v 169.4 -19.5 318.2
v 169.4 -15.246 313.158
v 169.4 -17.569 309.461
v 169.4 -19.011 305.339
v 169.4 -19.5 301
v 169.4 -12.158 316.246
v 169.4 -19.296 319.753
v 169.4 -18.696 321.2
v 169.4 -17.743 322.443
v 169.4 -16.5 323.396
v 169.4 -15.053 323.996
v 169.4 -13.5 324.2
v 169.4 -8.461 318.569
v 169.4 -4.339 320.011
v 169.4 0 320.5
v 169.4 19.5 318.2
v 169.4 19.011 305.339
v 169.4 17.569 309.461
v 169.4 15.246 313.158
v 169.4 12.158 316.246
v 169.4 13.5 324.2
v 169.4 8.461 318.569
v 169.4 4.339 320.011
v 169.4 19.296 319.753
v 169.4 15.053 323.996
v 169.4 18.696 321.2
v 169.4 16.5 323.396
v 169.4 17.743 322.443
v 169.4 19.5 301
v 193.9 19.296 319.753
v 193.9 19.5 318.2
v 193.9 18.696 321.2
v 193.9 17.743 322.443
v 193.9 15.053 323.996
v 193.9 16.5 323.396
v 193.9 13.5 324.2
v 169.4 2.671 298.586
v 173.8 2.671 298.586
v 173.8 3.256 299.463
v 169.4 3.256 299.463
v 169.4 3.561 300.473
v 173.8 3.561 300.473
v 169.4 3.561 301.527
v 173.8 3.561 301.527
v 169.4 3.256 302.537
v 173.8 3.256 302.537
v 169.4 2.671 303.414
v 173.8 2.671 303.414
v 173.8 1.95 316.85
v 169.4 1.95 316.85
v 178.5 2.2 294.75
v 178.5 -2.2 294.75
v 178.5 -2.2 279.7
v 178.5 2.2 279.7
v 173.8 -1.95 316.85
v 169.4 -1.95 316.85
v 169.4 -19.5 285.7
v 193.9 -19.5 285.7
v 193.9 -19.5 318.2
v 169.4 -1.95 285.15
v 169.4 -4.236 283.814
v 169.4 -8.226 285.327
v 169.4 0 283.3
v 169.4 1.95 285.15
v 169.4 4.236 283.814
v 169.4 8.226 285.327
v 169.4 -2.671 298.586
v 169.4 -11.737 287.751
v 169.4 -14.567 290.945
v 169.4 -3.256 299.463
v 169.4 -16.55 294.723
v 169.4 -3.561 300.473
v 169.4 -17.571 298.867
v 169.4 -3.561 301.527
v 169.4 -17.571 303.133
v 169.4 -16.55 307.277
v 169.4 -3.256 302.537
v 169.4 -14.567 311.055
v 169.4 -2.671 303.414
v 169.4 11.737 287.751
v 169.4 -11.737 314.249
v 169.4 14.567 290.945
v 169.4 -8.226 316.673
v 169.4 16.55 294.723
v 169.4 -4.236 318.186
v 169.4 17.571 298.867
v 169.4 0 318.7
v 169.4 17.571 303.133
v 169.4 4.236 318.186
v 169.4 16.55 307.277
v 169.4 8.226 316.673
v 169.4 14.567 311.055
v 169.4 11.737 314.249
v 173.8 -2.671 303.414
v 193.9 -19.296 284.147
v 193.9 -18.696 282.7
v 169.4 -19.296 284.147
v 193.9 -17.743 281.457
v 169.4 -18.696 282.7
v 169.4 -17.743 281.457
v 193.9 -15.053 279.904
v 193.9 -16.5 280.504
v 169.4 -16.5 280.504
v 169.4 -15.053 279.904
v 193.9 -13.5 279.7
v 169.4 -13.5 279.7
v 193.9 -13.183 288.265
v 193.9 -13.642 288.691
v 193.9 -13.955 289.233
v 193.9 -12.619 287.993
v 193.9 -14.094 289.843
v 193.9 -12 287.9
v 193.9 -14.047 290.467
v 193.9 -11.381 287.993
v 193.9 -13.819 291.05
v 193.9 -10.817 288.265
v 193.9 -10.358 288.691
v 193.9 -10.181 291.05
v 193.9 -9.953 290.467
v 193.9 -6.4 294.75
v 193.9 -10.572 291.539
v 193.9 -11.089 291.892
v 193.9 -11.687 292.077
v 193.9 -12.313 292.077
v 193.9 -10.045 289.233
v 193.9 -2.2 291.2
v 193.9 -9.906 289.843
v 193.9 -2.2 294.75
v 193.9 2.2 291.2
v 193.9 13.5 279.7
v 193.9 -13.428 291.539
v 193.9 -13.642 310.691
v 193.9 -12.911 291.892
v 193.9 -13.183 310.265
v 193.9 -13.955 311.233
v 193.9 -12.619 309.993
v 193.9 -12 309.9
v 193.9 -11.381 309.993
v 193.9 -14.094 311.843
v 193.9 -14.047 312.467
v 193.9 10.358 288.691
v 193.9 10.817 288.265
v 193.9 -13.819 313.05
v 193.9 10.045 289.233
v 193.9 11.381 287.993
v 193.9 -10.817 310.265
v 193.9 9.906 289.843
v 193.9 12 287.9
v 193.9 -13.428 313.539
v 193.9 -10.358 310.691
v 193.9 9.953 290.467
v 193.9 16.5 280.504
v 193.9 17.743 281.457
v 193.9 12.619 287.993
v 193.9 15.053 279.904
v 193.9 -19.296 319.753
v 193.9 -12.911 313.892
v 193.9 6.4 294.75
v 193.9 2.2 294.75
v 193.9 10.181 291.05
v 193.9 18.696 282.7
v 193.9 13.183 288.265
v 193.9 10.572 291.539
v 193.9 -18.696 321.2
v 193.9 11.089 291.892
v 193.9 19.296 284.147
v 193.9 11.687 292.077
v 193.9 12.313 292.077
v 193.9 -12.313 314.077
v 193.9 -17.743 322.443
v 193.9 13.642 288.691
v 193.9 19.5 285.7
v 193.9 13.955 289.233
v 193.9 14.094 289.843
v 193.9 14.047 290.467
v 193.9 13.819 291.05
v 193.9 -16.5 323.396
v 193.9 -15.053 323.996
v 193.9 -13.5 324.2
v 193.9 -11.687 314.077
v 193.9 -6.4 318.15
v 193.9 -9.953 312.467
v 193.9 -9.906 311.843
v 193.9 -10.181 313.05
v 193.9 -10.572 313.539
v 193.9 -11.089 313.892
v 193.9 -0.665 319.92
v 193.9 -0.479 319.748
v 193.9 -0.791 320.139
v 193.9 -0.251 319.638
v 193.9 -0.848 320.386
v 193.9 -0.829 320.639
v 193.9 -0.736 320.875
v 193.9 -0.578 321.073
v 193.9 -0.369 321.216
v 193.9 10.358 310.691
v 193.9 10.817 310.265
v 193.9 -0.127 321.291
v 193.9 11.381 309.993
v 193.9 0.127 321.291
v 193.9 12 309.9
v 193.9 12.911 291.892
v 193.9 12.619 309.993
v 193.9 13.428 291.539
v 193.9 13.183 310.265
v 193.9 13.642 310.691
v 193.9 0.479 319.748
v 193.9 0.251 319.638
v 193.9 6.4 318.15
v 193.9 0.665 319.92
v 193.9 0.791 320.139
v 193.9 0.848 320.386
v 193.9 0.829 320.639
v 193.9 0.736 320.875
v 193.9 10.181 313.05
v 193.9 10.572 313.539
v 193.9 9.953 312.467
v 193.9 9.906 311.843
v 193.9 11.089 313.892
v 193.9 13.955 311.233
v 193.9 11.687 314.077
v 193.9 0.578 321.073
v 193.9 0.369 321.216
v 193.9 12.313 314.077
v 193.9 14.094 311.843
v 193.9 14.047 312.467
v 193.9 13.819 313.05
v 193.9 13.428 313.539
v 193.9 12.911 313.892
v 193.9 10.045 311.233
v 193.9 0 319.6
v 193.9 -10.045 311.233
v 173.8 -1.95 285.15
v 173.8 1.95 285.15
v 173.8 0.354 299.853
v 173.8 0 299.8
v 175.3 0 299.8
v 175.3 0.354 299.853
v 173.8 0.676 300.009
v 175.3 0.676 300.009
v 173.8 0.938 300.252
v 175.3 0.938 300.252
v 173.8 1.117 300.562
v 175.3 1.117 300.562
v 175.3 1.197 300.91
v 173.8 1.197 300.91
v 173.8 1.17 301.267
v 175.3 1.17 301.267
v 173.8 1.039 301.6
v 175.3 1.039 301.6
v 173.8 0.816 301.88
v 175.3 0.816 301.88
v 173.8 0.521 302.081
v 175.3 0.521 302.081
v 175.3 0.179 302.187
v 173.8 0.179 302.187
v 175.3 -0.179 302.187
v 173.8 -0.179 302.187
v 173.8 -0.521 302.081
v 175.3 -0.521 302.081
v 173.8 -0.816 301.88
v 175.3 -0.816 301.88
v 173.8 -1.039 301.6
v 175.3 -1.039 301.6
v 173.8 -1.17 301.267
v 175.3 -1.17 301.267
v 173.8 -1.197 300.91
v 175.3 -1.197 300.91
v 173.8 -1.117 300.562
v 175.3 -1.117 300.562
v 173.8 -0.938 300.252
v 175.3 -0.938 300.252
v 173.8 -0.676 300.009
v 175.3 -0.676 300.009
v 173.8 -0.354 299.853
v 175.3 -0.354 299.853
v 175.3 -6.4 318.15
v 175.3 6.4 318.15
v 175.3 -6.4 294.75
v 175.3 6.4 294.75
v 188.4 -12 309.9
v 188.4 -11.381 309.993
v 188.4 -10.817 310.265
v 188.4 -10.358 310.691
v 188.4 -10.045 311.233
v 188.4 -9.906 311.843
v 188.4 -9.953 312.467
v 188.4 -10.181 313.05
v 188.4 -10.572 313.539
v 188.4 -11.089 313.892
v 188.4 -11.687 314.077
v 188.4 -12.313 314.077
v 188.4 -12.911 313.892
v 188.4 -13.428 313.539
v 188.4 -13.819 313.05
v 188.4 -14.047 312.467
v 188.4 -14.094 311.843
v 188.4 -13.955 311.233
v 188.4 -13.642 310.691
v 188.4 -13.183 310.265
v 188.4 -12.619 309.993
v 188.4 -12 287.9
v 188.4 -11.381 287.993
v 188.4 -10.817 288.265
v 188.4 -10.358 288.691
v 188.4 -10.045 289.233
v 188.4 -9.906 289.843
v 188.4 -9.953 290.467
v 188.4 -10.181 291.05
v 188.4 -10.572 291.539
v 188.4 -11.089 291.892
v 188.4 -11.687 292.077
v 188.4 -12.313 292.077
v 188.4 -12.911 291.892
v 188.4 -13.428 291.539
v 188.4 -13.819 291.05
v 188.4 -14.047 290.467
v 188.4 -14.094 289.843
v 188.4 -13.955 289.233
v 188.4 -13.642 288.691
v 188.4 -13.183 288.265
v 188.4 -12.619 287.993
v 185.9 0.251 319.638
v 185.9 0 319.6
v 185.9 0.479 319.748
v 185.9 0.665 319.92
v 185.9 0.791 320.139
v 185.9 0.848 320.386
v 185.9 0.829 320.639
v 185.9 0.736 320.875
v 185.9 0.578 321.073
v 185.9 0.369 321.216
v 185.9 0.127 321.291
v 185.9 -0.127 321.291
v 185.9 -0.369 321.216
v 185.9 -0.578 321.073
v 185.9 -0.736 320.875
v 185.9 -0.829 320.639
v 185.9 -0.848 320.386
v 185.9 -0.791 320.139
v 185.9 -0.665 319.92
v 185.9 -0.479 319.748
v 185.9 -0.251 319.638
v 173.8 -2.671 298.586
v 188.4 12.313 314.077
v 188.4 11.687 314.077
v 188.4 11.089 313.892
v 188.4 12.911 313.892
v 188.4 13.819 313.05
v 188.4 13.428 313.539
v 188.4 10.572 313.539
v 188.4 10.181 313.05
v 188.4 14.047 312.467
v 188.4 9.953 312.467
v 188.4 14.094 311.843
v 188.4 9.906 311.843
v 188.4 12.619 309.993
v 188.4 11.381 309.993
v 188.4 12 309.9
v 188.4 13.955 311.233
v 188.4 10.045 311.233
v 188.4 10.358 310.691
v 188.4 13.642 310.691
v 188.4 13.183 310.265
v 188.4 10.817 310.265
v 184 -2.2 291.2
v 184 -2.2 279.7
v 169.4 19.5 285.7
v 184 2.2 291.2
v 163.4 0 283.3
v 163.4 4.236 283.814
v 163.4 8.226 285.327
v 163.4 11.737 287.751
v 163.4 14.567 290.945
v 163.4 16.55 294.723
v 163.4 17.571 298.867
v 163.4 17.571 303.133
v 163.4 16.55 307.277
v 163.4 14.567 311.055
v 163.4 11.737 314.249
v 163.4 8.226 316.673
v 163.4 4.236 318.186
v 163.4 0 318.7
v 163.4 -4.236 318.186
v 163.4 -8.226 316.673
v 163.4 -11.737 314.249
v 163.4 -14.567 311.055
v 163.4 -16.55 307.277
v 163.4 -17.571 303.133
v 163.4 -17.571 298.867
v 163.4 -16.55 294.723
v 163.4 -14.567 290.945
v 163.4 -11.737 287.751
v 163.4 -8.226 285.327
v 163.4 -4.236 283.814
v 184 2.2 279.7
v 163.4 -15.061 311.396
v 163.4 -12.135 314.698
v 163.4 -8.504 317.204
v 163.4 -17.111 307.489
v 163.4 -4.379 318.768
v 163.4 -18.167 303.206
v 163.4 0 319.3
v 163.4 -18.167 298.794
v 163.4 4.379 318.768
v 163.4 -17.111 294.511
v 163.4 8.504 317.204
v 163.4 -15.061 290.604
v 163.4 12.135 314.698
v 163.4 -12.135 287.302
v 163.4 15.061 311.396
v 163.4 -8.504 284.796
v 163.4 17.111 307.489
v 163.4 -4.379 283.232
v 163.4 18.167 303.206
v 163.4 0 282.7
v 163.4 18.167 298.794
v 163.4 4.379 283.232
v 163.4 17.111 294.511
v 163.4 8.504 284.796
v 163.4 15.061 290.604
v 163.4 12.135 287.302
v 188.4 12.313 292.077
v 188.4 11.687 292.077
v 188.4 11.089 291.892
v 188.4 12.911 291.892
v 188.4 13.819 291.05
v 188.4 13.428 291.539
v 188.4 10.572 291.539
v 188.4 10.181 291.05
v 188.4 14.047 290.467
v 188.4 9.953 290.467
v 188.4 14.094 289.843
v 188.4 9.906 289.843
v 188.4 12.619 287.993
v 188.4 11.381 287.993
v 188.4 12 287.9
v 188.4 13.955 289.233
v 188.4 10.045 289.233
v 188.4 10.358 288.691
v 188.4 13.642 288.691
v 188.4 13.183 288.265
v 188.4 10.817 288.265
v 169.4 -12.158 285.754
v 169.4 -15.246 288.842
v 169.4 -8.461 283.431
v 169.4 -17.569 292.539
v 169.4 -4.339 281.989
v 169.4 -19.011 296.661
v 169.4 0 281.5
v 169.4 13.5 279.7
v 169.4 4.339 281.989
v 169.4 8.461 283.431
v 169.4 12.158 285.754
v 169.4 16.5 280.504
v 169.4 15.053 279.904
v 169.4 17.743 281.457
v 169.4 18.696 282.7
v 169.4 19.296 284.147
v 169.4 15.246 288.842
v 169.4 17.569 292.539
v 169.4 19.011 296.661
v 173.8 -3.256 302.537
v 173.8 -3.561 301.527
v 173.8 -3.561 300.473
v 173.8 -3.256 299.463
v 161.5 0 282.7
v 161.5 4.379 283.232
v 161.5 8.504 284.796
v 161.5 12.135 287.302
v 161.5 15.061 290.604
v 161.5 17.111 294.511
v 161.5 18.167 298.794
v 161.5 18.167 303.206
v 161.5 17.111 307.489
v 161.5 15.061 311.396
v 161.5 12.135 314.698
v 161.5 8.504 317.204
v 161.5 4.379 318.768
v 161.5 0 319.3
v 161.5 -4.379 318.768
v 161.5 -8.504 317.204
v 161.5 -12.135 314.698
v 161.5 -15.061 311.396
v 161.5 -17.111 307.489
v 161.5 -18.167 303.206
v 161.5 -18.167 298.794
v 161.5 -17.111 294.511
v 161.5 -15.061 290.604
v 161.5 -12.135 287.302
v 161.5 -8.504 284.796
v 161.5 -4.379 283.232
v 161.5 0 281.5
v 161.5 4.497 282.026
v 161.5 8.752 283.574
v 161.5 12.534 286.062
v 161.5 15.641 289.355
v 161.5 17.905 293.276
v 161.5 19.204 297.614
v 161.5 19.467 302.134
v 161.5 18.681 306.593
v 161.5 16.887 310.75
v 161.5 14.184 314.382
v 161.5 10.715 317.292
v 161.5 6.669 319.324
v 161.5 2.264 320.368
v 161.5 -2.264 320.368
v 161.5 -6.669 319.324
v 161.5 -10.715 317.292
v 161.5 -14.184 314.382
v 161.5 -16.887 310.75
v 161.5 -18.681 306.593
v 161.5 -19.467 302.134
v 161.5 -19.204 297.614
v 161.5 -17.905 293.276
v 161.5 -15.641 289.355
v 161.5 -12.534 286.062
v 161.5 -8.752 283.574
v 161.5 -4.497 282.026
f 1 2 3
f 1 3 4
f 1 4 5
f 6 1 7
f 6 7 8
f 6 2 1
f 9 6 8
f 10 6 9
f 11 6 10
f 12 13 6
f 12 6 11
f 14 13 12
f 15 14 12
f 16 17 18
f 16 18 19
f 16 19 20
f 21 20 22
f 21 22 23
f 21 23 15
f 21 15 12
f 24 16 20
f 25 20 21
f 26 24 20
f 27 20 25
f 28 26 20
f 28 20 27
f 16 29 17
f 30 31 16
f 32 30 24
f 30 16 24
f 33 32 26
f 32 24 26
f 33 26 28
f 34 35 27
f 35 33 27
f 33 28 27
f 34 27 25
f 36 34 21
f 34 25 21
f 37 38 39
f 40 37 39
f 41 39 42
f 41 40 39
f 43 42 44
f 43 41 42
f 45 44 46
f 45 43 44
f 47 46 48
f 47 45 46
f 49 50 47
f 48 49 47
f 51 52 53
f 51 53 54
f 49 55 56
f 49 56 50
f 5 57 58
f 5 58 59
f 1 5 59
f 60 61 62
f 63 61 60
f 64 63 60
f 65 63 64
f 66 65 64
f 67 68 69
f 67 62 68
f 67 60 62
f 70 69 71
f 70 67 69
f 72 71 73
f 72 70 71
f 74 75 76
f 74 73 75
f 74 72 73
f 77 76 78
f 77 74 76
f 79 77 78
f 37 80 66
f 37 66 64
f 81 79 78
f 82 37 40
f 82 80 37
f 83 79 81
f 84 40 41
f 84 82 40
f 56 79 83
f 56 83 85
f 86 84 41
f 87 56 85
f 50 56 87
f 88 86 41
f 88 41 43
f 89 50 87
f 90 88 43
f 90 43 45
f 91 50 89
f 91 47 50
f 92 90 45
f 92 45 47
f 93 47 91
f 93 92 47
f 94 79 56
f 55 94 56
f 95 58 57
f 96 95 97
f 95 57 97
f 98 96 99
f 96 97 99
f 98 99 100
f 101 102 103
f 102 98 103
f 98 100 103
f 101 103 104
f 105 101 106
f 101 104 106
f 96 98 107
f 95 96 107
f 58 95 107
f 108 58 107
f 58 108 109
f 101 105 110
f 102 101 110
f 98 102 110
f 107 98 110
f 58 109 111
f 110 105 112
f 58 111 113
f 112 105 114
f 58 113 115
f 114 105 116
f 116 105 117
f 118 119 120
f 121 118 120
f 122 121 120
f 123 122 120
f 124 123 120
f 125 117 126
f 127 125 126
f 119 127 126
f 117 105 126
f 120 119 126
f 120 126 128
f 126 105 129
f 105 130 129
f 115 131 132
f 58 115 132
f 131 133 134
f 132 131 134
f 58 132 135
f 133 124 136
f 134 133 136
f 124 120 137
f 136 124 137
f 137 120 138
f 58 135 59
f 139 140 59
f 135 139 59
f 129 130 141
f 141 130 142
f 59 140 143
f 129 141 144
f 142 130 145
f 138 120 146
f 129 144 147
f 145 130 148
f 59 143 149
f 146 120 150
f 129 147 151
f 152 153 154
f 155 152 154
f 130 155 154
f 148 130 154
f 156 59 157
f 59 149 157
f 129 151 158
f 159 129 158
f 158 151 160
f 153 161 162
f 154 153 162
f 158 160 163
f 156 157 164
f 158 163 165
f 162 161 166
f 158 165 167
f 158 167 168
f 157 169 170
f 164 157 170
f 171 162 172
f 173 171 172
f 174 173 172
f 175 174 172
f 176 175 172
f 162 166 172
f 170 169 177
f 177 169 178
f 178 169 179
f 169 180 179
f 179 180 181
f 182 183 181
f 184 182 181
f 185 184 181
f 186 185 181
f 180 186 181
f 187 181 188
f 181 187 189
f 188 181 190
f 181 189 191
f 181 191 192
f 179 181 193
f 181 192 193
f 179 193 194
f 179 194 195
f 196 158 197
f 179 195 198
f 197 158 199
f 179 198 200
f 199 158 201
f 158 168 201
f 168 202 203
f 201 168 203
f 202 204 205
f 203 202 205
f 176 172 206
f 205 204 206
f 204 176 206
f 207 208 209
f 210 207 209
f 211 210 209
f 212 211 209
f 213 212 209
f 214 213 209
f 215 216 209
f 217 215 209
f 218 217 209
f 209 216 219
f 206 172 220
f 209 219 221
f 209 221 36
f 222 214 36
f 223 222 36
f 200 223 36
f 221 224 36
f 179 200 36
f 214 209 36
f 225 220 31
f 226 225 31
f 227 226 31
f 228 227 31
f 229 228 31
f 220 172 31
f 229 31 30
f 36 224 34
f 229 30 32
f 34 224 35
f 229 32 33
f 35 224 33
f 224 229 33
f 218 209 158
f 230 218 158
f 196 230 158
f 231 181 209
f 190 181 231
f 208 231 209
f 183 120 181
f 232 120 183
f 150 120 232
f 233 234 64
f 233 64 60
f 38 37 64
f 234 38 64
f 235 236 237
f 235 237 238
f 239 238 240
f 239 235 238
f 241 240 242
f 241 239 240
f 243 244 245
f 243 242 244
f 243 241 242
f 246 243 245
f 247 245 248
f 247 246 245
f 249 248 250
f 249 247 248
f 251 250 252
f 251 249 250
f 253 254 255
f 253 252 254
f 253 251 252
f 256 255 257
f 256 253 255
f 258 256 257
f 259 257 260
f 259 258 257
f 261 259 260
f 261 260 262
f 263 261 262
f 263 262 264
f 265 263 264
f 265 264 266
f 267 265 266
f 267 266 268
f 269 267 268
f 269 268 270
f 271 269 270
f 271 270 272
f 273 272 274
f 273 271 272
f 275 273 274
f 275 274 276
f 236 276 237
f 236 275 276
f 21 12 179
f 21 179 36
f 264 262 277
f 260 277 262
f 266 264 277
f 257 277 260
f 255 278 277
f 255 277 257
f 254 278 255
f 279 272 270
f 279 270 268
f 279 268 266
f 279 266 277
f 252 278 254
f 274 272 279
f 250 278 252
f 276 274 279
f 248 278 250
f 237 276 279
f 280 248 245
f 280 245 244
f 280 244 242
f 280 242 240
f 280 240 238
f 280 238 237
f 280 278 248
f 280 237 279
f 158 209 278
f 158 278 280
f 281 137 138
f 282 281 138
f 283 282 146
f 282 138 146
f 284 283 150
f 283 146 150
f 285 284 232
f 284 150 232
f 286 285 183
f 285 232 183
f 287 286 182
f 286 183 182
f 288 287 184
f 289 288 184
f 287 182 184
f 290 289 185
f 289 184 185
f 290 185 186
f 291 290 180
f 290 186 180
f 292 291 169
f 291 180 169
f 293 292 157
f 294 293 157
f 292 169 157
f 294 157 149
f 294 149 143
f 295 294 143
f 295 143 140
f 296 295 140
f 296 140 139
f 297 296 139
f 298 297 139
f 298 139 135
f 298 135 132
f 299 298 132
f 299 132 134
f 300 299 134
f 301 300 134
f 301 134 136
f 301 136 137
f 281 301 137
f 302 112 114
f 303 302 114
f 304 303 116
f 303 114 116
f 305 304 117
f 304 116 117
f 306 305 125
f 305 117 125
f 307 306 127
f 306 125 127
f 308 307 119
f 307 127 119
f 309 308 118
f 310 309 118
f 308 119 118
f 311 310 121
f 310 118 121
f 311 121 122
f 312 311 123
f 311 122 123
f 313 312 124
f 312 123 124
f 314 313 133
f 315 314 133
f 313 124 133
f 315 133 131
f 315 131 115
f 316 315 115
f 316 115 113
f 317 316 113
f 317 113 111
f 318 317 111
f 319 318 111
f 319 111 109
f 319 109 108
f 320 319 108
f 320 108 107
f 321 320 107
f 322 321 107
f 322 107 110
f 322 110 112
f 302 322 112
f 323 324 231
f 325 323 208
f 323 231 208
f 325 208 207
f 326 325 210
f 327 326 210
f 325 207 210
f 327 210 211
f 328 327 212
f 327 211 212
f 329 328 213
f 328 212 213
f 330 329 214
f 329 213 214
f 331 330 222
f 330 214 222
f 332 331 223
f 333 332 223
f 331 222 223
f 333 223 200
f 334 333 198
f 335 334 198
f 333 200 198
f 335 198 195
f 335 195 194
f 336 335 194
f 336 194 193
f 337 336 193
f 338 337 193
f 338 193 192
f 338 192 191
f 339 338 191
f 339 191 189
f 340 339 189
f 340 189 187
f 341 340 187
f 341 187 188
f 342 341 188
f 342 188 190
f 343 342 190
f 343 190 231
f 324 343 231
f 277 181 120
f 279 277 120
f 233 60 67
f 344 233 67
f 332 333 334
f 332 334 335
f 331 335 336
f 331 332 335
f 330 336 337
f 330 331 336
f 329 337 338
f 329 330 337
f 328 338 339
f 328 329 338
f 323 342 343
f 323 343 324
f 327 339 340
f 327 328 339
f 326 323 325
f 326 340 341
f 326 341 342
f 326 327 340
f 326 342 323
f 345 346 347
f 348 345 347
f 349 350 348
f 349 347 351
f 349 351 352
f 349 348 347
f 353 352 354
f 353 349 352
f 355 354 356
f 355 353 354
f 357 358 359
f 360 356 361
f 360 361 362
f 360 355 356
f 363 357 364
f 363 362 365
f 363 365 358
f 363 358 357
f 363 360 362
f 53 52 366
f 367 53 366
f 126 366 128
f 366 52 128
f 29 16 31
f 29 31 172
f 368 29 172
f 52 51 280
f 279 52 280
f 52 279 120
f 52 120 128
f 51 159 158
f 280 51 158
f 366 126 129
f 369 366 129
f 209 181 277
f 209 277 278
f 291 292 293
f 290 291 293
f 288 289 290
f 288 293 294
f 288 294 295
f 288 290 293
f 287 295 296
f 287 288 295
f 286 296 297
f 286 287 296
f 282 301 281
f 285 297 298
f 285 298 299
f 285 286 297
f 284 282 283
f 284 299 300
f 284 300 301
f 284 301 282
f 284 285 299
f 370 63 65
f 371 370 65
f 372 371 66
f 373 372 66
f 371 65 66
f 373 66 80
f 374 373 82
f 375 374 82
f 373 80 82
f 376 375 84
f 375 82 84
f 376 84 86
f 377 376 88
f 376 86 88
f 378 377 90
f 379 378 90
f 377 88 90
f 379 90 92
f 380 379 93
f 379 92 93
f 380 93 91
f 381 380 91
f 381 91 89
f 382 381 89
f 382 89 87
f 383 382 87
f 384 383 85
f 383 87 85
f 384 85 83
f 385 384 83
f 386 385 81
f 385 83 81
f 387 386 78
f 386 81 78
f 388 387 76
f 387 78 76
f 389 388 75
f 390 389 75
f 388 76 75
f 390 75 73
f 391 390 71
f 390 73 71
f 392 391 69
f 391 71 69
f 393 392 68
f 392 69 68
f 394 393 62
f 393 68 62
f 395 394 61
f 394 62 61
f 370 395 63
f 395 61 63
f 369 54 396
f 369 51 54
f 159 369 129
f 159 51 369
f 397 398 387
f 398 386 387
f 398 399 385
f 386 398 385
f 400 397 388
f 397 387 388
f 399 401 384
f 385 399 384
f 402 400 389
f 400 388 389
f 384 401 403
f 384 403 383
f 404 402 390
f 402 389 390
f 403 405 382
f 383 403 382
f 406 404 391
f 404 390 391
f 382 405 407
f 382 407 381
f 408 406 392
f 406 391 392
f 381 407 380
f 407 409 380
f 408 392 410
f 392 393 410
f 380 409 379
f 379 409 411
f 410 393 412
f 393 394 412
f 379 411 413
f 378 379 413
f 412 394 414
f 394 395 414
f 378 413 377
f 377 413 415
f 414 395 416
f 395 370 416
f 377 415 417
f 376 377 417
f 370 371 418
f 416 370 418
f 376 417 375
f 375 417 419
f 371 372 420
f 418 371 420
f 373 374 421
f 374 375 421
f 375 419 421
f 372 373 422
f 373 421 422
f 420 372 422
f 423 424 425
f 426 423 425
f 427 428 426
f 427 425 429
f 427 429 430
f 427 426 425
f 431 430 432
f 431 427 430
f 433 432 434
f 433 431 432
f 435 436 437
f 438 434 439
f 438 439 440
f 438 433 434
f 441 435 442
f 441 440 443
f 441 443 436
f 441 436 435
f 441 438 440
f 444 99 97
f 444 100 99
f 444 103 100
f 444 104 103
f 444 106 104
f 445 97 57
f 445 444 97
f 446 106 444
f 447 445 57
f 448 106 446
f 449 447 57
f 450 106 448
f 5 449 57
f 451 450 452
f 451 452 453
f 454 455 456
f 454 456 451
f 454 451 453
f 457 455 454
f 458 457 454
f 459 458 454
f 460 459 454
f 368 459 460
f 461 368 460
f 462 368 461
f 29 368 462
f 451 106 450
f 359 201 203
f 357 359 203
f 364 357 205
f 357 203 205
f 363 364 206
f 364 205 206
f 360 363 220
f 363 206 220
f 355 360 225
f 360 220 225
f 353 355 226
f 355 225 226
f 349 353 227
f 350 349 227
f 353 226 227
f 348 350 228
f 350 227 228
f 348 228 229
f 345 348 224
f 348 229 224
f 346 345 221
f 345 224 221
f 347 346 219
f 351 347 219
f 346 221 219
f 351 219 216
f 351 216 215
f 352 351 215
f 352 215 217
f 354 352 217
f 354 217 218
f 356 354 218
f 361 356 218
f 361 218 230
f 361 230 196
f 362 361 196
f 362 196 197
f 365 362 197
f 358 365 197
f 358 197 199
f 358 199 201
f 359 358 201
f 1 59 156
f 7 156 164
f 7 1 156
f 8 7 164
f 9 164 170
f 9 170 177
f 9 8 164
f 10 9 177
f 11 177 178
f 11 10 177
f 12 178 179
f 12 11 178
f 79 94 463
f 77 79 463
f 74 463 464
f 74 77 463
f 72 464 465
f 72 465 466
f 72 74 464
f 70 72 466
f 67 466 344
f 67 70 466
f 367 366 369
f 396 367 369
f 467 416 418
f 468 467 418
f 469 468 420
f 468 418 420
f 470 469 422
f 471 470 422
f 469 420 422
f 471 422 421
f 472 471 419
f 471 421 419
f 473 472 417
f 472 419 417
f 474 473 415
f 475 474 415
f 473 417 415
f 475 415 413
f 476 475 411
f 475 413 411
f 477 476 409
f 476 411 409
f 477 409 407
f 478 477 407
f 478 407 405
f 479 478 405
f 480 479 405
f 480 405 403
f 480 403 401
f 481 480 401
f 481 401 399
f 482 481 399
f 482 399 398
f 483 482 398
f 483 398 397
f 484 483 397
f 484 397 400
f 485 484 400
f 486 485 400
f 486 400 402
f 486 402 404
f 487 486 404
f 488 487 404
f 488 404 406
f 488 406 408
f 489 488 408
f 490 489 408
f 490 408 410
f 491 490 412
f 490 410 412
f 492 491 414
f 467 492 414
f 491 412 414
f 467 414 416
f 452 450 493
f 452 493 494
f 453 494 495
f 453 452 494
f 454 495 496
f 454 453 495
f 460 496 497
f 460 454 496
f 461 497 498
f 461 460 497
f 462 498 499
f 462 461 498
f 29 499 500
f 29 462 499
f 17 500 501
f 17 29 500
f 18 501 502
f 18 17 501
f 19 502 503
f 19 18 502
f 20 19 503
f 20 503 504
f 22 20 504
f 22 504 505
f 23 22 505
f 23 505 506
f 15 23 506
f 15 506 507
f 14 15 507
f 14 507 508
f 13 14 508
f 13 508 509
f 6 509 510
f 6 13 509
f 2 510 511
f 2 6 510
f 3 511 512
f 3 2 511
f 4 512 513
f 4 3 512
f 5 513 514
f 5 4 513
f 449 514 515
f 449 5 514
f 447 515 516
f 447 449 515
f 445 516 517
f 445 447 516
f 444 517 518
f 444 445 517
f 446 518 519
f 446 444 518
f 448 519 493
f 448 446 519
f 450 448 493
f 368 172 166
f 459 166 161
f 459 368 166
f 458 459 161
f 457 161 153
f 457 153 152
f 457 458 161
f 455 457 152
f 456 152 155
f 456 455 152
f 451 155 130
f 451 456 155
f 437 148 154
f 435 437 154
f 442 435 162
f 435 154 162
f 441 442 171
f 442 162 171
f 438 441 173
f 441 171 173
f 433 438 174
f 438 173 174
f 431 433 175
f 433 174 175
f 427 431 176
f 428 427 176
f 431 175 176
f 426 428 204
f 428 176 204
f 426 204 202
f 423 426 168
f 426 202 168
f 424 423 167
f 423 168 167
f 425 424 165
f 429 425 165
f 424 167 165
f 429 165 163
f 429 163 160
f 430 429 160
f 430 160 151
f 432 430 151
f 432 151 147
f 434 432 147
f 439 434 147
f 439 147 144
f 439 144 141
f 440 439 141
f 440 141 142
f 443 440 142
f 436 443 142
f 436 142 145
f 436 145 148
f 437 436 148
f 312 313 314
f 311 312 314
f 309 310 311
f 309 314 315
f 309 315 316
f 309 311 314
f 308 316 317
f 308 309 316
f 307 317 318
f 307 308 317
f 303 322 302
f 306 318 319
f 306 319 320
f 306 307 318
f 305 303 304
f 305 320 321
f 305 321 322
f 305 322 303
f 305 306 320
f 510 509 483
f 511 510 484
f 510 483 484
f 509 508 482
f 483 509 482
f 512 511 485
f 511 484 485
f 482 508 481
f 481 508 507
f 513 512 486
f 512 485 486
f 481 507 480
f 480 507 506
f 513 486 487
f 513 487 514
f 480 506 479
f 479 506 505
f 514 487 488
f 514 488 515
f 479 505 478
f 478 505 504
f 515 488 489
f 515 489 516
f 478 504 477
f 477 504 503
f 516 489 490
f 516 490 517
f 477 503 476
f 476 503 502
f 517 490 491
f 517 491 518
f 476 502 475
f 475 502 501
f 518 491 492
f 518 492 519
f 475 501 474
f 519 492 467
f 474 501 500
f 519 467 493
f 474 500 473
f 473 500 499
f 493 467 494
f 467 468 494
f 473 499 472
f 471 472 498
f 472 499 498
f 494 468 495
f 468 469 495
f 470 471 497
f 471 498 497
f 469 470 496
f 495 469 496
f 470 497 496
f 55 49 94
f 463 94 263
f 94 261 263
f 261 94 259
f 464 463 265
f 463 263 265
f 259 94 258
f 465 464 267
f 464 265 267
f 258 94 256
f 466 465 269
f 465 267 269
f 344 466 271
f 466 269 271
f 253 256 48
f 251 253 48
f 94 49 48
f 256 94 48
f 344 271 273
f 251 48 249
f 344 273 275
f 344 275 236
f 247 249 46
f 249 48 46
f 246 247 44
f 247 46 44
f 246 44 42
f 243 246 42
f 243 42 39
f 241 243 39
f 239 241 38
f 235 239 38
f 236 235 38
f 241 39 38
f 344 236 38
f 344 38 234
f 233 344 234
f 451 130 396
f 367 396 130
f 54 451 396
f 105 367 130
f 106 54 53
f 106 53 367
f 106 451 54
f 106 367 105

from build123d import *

# Parameters (mm, degrees)
SKETCH1_W           = 40.7
SKETCH1_H           = 17
BOSS_EXTRUDE1_DEPTH = 24.5
SKETCH2_W           = 40.7
SKETCH2_H           = 34
BOSS_EXTRUDE2_DEPTH = 4
SKETCH3_R           = 3.6
CUT_EXTRUDE1_DEPTH  = 4.4
CUT_EXTRUDE2_DEPTH  = 4.4
SKETCH5_R           = 1.2
CUT_EXTRUDE3_DEPTH  = 7
SKETCH6_W           = 23.4
SKETCH6_H           = 12.8
CUT_EXTRUDE4_DEPTH  = 19.2
SKETCH7_W           = 3.7
SKETCH7_H           = 4.4
CUT_EXTRUDE5_DEPTH  = 16
SKETCH8_R           = 0.85
CUT_EXTRUDE6_DEPTH  = 8.6
SKETCH9_R           = 1.7
CUT_EXTRUDE7_DEPTH  = 4.7
SKETCH10_W          = 5.5
SKETCH10_H          = 4.4
CUT_EXTRUDE8_DEPTH  = 8.3
BOSS_EXTRUDE3_DEPTH = 24.5
SKETCH12_W          = 5.5
SKETCH12_H          = 4.4
CUT_EXTRUDE9_DEPTH  = 3.5
CUT_EXTRUDE10_DEPTH = 326.708673511
SKETCH14_R          = 19.5
SKETCH14_R_2        = 18.3
BOSS_EXTRUDE4_DEPTH = 7.9
SKETCH15_R          = 2.1
CUT_EXTRUDE11_DEPTH = 6.1
SKETCH16_R          = 18.3
SKETCH16_R_2        = 17.7
BOSS_EXTRUDE6_DEPTH = 6


with BuildPart() as part:
    # Sketch1 → Boss-Extrude1 (new body)
    with BuildSketch(Plane(origin=(169.4, 0, 0), x_dir=(0, 0, -1), z_dir=(1, 0, 0))):
        with Locations((-303.85, 0)):
            Rectangle(SKETCH1_W, SKETCH1_H)
    extrude(amount=BOSS_EXTRUDE1_DEPTH)

    # Sketch2 → Boss-Extrude2 (add)
    with BuildSketch(Plane(origin=(189.9, 0, 0), x_dir=(0, 0, -1), z_dir=(1, 0, 0))):
        with Locations((-303.85, 0)):
            Rectangle(SKETCH2_W, SKETCH2_H)
    extrude(amount=BOSS_EXTRUDE2_DEPTH)

    # Sketch3 → Cut-Extrude1 (cut)
    with BuildSketch(Plane(origin=(169.4, 0, 0), x_dir=(0, 0, -1), z_dir=(1, 0, 0))):
        with Locations((-301, 0)):
            Circle(SKETCH3_R)
    extrude(amount=CUT_EXTRUDE1_DEPTH, mode=Mode.SUBTRACT)

    # Sketch4 → Cut-Extrude2 (cut)
    with BuildSketch(Plane(origin=(169.4, 0, 0), x_dir=(0, 0, -1), z_dir=(1, 0, 0))):
        Polygon((-285.15, -1.95), (-301, -2.8), (-316.85, -1.95), (-316.85, 1.95), (-301, 2.8), (-285.15, 1.95), align=None)
    extrude(amount=CUT_EXTRUDE2_DEPTH, mode=Mode.SUBTRACT)

    # Sketch5 → Cut-Extrude3 (cut)
    with BuildSketch(Plane(origin=(169.4, 0, 0), x_dir=(0, 0, -1), z_dir=(1, 0, 0))):
        with Locations((-301, 0)):
            Circle(SKETCH5_R)
    extrude(amount=CUT_EXTRUDE3_DEPTH, mode=Mode.SUBTRACT)

    # Sketch6 → Cut-Extrude4 (cut)
    with BuildSketch(Plane(origin=(194.5, 0, 0), x_dir=(0, 0, -1), z_dir=(1, 0, 0))):
        with Locations((-306.45, 0)):
            Rectangle(SKETCH6_W, SKETCH6_H)
    extrude(amount=-CUT_EXTRUDE4_DEPTH, mode=Mode.SUBTRACT)

    # Sketch7 → Cut-Extrude5 (cut)
    with BuildSketch(Plane(origin=(194.5, 0, 0), x_dir=(0, 0, -1), z_dir=(1, 0, 0))):
        with Locations((-293.05, 0)):
            Rectangle(SKETCH7_W, SKETCH7_H)
    extrude(amount=-CUT_EXTRUDE5_DEPTH, mode=Mode.SUBTRACT)

    # Sketch8 → Cut-Extrude6 (cut)
    with BuildSketch(Plane(origin=(194.5, 0, 0), x_dir=(0, 0, -1), z_dir=(1, 0, 0))):
        with Locations((-320.45, 0)):
            Circle(SKETCH8_R)
    extrude(amount=-CUT_EXTRUDE6_DEPTH, mode=Mode.SUBTRACT)

    # Sketch9 → Cut-Extrude7 (cut)
    with BuildSketch(Plane(origin=(194.5, 0, 0), x_dir=(0, 0, -1), z_dir=(1, 0, 0))):
        with Locations(Location((-290, 12, 0), (0, 0, 180))):
            Circle(SKETCH9_R)
        with Locations(Location((-290, -12, 0), (0, 0, 180))):
            Circle(SKETCH9_R)
        with Locations(Location((-312, 12, 0), (0, 0, 180))):
            Circle(SKETCH9_R)
        with Locations(Location((-312, -12, 0), (0, 0, 180))):
            Circle(SKETCH9_R)
    extrude(amount=-CUT_EXTRUDE7_DEPTH, mode=Mode.SUBTRACT)

    # Sketch10 → Cut-Extrude8 (cut)
    with BuildSketch(Plane.XY.offset(283)):
        with Locations((181.25, 0)):
            Rectangle(SKETCH10_W, SKETCH10_H)
    extrude(amount=CUT_EXTRUDE8_DEPTH, mode=Mode.SUBTRACT)

    # Sketch11 → Boss-Extrude3 (add)
    with BuildSketch(Plane(origin=(169.4, 0, 0), x_dir=(0, 0, -1), z_dir=(1, 0, 0))):
        Polygon((-279.7, -19.5), (-324.2, -19.5), (-324.2, -8.5), (-283.5, -8.5), (-283.5, 8.5), (-324.2, 8.5), (-324.2, 19.5), (-279.7, 19.5), align=None)
    extrude(amount=BOSS_EXTRUDE3_DEPTH)

    # Sketch12 → Cut-Extrude9 (cut, symmetric)
    with BuildSketch(Plane.XY.offset(283)):
        with Locations((181.25, 0)):
            Rectangle(SKETCH12_W, SKETCH12_H)
    extrude(amount=CUT_EXTRUDE9_DEPTH, both=True, mode=Mode.SUBTRACT)

    # Sketch13 → Cut-Extrude10 (cut, through all)
    with BuildSketch(Plane(origin=(169.4, 0, 0), x_dir=(0, 0, -1), z_dir=(1, 0, 0))):
        with BuildLine():
            Line((-324.2, 13.5), (-325.5, 13.5))
            Line((-325.5, 13.5), (-325.5, 20.5))
            Line((-325.5, 20.5), (-318.2, 20.5))
            Line((-318.2, 20.5), (-318.2, 19.5))
            ThreePointArc((-318.2, 19.5), (-322.442640687, 17.742640687), (-324.2, 13.5))
        make_face()
        with BuildLine():
            Line((-324.2, -13.5), (-325.5, -13.5))
            Line((-325.5, -13.5), (-325.5, -20.5))
            Line((-325.5, -20.5), (-318.2, -20.5))
            Line((-318.2, -20.5), (-318.2, -19.5))
            ThreePointArc((-318.2, -19.5), (-322.442640687, -17.742640687), (-324.2, -13.5))
        make_face()
        with BuildLine():
            Line((-279.7, 13.5), (-278.4, 13.5))
            Line((-278.4, 13.5), (-278.4, 20.5))
            Line((-278.4, 20.5), (-285.7, 20.5))
            Line((-285.7, 20.5), (-285.7, 19.5))
            ThreePointArc((-285.7, 19.5), (-281.457359313, 17.742640687), (-279.7, 13.5))
        make_face()
        with BuildLine():
            Line((-279.7, -13.5), (-278.4, -13.5))
            Line((-278.4, -13.5), (-278.4, -20.5))
            Line((-278.4, -20.5), (-285.7, -20.5))
            Line((-285.7, -20.5), (-285.7, -19.5))
            ThreePointArc((-285.7, -19.5), (-281.457359313, -17.742640687), (-279.7, -13.5))
        make_face()
    extrude(amount=CUT_EXTRUDE10_DEPTH, mode=Mode.SUBTRACT)

    # Sketch14 → Boss-Extrude4 (add)
    with BuildSketch(Plane(origin=(169.4, 0, 0), x_dir=(0, 0, -1), z_dir=(1, 0, 0))):
        with Locations((-301, 0)):
            Circle(SKETCH14_R)
        with Locations((-301, 0)):
            Circle(SKETCH14_R_2, mode=Mode.SUBTRACT)
    extrude(amount=-BOSS_EXTRUDE4_DEPTH)

    # Sketch15 → Cut-Extrude11 (cut)
    with BuildSketch(Plane(origin=(194.5, 0, 0), x_dir=(0, 0, -1), z_dir=(1, 0, 0))):
        with Locations((-290, 12)):
            Circle(SKETCH15_R)
        with Locations((-290, -12)):
            Circle(SKETCH15_R)
        with Locations((-312, 12)):
            Circle(SKETCH15_R)
        with Locations((-312, -12)):
            Circle(SKETCH15_R)
    extrude(amount=-CUT_EXTRUDE11_DEPTH, mode=Mode.SUBTRACT)

    # Sketch16 → Boss-Extrude6 (add)
    with BuildSketch(Plane(origin=(169.4, 0, 0), x_dir=(0, 0, -1), z_dir=(1, 0, 0))):
        with Locations((-301, 0)):
            Circle(SKETCH16_R)
        with Locations((-301, 0)):
            Circle(SKETCH16_R_2, mode=Mode.SUBTRACT)
    extrude(amount=-BOSS_EXTRUDE6_DEPTH)


solid = part.part
